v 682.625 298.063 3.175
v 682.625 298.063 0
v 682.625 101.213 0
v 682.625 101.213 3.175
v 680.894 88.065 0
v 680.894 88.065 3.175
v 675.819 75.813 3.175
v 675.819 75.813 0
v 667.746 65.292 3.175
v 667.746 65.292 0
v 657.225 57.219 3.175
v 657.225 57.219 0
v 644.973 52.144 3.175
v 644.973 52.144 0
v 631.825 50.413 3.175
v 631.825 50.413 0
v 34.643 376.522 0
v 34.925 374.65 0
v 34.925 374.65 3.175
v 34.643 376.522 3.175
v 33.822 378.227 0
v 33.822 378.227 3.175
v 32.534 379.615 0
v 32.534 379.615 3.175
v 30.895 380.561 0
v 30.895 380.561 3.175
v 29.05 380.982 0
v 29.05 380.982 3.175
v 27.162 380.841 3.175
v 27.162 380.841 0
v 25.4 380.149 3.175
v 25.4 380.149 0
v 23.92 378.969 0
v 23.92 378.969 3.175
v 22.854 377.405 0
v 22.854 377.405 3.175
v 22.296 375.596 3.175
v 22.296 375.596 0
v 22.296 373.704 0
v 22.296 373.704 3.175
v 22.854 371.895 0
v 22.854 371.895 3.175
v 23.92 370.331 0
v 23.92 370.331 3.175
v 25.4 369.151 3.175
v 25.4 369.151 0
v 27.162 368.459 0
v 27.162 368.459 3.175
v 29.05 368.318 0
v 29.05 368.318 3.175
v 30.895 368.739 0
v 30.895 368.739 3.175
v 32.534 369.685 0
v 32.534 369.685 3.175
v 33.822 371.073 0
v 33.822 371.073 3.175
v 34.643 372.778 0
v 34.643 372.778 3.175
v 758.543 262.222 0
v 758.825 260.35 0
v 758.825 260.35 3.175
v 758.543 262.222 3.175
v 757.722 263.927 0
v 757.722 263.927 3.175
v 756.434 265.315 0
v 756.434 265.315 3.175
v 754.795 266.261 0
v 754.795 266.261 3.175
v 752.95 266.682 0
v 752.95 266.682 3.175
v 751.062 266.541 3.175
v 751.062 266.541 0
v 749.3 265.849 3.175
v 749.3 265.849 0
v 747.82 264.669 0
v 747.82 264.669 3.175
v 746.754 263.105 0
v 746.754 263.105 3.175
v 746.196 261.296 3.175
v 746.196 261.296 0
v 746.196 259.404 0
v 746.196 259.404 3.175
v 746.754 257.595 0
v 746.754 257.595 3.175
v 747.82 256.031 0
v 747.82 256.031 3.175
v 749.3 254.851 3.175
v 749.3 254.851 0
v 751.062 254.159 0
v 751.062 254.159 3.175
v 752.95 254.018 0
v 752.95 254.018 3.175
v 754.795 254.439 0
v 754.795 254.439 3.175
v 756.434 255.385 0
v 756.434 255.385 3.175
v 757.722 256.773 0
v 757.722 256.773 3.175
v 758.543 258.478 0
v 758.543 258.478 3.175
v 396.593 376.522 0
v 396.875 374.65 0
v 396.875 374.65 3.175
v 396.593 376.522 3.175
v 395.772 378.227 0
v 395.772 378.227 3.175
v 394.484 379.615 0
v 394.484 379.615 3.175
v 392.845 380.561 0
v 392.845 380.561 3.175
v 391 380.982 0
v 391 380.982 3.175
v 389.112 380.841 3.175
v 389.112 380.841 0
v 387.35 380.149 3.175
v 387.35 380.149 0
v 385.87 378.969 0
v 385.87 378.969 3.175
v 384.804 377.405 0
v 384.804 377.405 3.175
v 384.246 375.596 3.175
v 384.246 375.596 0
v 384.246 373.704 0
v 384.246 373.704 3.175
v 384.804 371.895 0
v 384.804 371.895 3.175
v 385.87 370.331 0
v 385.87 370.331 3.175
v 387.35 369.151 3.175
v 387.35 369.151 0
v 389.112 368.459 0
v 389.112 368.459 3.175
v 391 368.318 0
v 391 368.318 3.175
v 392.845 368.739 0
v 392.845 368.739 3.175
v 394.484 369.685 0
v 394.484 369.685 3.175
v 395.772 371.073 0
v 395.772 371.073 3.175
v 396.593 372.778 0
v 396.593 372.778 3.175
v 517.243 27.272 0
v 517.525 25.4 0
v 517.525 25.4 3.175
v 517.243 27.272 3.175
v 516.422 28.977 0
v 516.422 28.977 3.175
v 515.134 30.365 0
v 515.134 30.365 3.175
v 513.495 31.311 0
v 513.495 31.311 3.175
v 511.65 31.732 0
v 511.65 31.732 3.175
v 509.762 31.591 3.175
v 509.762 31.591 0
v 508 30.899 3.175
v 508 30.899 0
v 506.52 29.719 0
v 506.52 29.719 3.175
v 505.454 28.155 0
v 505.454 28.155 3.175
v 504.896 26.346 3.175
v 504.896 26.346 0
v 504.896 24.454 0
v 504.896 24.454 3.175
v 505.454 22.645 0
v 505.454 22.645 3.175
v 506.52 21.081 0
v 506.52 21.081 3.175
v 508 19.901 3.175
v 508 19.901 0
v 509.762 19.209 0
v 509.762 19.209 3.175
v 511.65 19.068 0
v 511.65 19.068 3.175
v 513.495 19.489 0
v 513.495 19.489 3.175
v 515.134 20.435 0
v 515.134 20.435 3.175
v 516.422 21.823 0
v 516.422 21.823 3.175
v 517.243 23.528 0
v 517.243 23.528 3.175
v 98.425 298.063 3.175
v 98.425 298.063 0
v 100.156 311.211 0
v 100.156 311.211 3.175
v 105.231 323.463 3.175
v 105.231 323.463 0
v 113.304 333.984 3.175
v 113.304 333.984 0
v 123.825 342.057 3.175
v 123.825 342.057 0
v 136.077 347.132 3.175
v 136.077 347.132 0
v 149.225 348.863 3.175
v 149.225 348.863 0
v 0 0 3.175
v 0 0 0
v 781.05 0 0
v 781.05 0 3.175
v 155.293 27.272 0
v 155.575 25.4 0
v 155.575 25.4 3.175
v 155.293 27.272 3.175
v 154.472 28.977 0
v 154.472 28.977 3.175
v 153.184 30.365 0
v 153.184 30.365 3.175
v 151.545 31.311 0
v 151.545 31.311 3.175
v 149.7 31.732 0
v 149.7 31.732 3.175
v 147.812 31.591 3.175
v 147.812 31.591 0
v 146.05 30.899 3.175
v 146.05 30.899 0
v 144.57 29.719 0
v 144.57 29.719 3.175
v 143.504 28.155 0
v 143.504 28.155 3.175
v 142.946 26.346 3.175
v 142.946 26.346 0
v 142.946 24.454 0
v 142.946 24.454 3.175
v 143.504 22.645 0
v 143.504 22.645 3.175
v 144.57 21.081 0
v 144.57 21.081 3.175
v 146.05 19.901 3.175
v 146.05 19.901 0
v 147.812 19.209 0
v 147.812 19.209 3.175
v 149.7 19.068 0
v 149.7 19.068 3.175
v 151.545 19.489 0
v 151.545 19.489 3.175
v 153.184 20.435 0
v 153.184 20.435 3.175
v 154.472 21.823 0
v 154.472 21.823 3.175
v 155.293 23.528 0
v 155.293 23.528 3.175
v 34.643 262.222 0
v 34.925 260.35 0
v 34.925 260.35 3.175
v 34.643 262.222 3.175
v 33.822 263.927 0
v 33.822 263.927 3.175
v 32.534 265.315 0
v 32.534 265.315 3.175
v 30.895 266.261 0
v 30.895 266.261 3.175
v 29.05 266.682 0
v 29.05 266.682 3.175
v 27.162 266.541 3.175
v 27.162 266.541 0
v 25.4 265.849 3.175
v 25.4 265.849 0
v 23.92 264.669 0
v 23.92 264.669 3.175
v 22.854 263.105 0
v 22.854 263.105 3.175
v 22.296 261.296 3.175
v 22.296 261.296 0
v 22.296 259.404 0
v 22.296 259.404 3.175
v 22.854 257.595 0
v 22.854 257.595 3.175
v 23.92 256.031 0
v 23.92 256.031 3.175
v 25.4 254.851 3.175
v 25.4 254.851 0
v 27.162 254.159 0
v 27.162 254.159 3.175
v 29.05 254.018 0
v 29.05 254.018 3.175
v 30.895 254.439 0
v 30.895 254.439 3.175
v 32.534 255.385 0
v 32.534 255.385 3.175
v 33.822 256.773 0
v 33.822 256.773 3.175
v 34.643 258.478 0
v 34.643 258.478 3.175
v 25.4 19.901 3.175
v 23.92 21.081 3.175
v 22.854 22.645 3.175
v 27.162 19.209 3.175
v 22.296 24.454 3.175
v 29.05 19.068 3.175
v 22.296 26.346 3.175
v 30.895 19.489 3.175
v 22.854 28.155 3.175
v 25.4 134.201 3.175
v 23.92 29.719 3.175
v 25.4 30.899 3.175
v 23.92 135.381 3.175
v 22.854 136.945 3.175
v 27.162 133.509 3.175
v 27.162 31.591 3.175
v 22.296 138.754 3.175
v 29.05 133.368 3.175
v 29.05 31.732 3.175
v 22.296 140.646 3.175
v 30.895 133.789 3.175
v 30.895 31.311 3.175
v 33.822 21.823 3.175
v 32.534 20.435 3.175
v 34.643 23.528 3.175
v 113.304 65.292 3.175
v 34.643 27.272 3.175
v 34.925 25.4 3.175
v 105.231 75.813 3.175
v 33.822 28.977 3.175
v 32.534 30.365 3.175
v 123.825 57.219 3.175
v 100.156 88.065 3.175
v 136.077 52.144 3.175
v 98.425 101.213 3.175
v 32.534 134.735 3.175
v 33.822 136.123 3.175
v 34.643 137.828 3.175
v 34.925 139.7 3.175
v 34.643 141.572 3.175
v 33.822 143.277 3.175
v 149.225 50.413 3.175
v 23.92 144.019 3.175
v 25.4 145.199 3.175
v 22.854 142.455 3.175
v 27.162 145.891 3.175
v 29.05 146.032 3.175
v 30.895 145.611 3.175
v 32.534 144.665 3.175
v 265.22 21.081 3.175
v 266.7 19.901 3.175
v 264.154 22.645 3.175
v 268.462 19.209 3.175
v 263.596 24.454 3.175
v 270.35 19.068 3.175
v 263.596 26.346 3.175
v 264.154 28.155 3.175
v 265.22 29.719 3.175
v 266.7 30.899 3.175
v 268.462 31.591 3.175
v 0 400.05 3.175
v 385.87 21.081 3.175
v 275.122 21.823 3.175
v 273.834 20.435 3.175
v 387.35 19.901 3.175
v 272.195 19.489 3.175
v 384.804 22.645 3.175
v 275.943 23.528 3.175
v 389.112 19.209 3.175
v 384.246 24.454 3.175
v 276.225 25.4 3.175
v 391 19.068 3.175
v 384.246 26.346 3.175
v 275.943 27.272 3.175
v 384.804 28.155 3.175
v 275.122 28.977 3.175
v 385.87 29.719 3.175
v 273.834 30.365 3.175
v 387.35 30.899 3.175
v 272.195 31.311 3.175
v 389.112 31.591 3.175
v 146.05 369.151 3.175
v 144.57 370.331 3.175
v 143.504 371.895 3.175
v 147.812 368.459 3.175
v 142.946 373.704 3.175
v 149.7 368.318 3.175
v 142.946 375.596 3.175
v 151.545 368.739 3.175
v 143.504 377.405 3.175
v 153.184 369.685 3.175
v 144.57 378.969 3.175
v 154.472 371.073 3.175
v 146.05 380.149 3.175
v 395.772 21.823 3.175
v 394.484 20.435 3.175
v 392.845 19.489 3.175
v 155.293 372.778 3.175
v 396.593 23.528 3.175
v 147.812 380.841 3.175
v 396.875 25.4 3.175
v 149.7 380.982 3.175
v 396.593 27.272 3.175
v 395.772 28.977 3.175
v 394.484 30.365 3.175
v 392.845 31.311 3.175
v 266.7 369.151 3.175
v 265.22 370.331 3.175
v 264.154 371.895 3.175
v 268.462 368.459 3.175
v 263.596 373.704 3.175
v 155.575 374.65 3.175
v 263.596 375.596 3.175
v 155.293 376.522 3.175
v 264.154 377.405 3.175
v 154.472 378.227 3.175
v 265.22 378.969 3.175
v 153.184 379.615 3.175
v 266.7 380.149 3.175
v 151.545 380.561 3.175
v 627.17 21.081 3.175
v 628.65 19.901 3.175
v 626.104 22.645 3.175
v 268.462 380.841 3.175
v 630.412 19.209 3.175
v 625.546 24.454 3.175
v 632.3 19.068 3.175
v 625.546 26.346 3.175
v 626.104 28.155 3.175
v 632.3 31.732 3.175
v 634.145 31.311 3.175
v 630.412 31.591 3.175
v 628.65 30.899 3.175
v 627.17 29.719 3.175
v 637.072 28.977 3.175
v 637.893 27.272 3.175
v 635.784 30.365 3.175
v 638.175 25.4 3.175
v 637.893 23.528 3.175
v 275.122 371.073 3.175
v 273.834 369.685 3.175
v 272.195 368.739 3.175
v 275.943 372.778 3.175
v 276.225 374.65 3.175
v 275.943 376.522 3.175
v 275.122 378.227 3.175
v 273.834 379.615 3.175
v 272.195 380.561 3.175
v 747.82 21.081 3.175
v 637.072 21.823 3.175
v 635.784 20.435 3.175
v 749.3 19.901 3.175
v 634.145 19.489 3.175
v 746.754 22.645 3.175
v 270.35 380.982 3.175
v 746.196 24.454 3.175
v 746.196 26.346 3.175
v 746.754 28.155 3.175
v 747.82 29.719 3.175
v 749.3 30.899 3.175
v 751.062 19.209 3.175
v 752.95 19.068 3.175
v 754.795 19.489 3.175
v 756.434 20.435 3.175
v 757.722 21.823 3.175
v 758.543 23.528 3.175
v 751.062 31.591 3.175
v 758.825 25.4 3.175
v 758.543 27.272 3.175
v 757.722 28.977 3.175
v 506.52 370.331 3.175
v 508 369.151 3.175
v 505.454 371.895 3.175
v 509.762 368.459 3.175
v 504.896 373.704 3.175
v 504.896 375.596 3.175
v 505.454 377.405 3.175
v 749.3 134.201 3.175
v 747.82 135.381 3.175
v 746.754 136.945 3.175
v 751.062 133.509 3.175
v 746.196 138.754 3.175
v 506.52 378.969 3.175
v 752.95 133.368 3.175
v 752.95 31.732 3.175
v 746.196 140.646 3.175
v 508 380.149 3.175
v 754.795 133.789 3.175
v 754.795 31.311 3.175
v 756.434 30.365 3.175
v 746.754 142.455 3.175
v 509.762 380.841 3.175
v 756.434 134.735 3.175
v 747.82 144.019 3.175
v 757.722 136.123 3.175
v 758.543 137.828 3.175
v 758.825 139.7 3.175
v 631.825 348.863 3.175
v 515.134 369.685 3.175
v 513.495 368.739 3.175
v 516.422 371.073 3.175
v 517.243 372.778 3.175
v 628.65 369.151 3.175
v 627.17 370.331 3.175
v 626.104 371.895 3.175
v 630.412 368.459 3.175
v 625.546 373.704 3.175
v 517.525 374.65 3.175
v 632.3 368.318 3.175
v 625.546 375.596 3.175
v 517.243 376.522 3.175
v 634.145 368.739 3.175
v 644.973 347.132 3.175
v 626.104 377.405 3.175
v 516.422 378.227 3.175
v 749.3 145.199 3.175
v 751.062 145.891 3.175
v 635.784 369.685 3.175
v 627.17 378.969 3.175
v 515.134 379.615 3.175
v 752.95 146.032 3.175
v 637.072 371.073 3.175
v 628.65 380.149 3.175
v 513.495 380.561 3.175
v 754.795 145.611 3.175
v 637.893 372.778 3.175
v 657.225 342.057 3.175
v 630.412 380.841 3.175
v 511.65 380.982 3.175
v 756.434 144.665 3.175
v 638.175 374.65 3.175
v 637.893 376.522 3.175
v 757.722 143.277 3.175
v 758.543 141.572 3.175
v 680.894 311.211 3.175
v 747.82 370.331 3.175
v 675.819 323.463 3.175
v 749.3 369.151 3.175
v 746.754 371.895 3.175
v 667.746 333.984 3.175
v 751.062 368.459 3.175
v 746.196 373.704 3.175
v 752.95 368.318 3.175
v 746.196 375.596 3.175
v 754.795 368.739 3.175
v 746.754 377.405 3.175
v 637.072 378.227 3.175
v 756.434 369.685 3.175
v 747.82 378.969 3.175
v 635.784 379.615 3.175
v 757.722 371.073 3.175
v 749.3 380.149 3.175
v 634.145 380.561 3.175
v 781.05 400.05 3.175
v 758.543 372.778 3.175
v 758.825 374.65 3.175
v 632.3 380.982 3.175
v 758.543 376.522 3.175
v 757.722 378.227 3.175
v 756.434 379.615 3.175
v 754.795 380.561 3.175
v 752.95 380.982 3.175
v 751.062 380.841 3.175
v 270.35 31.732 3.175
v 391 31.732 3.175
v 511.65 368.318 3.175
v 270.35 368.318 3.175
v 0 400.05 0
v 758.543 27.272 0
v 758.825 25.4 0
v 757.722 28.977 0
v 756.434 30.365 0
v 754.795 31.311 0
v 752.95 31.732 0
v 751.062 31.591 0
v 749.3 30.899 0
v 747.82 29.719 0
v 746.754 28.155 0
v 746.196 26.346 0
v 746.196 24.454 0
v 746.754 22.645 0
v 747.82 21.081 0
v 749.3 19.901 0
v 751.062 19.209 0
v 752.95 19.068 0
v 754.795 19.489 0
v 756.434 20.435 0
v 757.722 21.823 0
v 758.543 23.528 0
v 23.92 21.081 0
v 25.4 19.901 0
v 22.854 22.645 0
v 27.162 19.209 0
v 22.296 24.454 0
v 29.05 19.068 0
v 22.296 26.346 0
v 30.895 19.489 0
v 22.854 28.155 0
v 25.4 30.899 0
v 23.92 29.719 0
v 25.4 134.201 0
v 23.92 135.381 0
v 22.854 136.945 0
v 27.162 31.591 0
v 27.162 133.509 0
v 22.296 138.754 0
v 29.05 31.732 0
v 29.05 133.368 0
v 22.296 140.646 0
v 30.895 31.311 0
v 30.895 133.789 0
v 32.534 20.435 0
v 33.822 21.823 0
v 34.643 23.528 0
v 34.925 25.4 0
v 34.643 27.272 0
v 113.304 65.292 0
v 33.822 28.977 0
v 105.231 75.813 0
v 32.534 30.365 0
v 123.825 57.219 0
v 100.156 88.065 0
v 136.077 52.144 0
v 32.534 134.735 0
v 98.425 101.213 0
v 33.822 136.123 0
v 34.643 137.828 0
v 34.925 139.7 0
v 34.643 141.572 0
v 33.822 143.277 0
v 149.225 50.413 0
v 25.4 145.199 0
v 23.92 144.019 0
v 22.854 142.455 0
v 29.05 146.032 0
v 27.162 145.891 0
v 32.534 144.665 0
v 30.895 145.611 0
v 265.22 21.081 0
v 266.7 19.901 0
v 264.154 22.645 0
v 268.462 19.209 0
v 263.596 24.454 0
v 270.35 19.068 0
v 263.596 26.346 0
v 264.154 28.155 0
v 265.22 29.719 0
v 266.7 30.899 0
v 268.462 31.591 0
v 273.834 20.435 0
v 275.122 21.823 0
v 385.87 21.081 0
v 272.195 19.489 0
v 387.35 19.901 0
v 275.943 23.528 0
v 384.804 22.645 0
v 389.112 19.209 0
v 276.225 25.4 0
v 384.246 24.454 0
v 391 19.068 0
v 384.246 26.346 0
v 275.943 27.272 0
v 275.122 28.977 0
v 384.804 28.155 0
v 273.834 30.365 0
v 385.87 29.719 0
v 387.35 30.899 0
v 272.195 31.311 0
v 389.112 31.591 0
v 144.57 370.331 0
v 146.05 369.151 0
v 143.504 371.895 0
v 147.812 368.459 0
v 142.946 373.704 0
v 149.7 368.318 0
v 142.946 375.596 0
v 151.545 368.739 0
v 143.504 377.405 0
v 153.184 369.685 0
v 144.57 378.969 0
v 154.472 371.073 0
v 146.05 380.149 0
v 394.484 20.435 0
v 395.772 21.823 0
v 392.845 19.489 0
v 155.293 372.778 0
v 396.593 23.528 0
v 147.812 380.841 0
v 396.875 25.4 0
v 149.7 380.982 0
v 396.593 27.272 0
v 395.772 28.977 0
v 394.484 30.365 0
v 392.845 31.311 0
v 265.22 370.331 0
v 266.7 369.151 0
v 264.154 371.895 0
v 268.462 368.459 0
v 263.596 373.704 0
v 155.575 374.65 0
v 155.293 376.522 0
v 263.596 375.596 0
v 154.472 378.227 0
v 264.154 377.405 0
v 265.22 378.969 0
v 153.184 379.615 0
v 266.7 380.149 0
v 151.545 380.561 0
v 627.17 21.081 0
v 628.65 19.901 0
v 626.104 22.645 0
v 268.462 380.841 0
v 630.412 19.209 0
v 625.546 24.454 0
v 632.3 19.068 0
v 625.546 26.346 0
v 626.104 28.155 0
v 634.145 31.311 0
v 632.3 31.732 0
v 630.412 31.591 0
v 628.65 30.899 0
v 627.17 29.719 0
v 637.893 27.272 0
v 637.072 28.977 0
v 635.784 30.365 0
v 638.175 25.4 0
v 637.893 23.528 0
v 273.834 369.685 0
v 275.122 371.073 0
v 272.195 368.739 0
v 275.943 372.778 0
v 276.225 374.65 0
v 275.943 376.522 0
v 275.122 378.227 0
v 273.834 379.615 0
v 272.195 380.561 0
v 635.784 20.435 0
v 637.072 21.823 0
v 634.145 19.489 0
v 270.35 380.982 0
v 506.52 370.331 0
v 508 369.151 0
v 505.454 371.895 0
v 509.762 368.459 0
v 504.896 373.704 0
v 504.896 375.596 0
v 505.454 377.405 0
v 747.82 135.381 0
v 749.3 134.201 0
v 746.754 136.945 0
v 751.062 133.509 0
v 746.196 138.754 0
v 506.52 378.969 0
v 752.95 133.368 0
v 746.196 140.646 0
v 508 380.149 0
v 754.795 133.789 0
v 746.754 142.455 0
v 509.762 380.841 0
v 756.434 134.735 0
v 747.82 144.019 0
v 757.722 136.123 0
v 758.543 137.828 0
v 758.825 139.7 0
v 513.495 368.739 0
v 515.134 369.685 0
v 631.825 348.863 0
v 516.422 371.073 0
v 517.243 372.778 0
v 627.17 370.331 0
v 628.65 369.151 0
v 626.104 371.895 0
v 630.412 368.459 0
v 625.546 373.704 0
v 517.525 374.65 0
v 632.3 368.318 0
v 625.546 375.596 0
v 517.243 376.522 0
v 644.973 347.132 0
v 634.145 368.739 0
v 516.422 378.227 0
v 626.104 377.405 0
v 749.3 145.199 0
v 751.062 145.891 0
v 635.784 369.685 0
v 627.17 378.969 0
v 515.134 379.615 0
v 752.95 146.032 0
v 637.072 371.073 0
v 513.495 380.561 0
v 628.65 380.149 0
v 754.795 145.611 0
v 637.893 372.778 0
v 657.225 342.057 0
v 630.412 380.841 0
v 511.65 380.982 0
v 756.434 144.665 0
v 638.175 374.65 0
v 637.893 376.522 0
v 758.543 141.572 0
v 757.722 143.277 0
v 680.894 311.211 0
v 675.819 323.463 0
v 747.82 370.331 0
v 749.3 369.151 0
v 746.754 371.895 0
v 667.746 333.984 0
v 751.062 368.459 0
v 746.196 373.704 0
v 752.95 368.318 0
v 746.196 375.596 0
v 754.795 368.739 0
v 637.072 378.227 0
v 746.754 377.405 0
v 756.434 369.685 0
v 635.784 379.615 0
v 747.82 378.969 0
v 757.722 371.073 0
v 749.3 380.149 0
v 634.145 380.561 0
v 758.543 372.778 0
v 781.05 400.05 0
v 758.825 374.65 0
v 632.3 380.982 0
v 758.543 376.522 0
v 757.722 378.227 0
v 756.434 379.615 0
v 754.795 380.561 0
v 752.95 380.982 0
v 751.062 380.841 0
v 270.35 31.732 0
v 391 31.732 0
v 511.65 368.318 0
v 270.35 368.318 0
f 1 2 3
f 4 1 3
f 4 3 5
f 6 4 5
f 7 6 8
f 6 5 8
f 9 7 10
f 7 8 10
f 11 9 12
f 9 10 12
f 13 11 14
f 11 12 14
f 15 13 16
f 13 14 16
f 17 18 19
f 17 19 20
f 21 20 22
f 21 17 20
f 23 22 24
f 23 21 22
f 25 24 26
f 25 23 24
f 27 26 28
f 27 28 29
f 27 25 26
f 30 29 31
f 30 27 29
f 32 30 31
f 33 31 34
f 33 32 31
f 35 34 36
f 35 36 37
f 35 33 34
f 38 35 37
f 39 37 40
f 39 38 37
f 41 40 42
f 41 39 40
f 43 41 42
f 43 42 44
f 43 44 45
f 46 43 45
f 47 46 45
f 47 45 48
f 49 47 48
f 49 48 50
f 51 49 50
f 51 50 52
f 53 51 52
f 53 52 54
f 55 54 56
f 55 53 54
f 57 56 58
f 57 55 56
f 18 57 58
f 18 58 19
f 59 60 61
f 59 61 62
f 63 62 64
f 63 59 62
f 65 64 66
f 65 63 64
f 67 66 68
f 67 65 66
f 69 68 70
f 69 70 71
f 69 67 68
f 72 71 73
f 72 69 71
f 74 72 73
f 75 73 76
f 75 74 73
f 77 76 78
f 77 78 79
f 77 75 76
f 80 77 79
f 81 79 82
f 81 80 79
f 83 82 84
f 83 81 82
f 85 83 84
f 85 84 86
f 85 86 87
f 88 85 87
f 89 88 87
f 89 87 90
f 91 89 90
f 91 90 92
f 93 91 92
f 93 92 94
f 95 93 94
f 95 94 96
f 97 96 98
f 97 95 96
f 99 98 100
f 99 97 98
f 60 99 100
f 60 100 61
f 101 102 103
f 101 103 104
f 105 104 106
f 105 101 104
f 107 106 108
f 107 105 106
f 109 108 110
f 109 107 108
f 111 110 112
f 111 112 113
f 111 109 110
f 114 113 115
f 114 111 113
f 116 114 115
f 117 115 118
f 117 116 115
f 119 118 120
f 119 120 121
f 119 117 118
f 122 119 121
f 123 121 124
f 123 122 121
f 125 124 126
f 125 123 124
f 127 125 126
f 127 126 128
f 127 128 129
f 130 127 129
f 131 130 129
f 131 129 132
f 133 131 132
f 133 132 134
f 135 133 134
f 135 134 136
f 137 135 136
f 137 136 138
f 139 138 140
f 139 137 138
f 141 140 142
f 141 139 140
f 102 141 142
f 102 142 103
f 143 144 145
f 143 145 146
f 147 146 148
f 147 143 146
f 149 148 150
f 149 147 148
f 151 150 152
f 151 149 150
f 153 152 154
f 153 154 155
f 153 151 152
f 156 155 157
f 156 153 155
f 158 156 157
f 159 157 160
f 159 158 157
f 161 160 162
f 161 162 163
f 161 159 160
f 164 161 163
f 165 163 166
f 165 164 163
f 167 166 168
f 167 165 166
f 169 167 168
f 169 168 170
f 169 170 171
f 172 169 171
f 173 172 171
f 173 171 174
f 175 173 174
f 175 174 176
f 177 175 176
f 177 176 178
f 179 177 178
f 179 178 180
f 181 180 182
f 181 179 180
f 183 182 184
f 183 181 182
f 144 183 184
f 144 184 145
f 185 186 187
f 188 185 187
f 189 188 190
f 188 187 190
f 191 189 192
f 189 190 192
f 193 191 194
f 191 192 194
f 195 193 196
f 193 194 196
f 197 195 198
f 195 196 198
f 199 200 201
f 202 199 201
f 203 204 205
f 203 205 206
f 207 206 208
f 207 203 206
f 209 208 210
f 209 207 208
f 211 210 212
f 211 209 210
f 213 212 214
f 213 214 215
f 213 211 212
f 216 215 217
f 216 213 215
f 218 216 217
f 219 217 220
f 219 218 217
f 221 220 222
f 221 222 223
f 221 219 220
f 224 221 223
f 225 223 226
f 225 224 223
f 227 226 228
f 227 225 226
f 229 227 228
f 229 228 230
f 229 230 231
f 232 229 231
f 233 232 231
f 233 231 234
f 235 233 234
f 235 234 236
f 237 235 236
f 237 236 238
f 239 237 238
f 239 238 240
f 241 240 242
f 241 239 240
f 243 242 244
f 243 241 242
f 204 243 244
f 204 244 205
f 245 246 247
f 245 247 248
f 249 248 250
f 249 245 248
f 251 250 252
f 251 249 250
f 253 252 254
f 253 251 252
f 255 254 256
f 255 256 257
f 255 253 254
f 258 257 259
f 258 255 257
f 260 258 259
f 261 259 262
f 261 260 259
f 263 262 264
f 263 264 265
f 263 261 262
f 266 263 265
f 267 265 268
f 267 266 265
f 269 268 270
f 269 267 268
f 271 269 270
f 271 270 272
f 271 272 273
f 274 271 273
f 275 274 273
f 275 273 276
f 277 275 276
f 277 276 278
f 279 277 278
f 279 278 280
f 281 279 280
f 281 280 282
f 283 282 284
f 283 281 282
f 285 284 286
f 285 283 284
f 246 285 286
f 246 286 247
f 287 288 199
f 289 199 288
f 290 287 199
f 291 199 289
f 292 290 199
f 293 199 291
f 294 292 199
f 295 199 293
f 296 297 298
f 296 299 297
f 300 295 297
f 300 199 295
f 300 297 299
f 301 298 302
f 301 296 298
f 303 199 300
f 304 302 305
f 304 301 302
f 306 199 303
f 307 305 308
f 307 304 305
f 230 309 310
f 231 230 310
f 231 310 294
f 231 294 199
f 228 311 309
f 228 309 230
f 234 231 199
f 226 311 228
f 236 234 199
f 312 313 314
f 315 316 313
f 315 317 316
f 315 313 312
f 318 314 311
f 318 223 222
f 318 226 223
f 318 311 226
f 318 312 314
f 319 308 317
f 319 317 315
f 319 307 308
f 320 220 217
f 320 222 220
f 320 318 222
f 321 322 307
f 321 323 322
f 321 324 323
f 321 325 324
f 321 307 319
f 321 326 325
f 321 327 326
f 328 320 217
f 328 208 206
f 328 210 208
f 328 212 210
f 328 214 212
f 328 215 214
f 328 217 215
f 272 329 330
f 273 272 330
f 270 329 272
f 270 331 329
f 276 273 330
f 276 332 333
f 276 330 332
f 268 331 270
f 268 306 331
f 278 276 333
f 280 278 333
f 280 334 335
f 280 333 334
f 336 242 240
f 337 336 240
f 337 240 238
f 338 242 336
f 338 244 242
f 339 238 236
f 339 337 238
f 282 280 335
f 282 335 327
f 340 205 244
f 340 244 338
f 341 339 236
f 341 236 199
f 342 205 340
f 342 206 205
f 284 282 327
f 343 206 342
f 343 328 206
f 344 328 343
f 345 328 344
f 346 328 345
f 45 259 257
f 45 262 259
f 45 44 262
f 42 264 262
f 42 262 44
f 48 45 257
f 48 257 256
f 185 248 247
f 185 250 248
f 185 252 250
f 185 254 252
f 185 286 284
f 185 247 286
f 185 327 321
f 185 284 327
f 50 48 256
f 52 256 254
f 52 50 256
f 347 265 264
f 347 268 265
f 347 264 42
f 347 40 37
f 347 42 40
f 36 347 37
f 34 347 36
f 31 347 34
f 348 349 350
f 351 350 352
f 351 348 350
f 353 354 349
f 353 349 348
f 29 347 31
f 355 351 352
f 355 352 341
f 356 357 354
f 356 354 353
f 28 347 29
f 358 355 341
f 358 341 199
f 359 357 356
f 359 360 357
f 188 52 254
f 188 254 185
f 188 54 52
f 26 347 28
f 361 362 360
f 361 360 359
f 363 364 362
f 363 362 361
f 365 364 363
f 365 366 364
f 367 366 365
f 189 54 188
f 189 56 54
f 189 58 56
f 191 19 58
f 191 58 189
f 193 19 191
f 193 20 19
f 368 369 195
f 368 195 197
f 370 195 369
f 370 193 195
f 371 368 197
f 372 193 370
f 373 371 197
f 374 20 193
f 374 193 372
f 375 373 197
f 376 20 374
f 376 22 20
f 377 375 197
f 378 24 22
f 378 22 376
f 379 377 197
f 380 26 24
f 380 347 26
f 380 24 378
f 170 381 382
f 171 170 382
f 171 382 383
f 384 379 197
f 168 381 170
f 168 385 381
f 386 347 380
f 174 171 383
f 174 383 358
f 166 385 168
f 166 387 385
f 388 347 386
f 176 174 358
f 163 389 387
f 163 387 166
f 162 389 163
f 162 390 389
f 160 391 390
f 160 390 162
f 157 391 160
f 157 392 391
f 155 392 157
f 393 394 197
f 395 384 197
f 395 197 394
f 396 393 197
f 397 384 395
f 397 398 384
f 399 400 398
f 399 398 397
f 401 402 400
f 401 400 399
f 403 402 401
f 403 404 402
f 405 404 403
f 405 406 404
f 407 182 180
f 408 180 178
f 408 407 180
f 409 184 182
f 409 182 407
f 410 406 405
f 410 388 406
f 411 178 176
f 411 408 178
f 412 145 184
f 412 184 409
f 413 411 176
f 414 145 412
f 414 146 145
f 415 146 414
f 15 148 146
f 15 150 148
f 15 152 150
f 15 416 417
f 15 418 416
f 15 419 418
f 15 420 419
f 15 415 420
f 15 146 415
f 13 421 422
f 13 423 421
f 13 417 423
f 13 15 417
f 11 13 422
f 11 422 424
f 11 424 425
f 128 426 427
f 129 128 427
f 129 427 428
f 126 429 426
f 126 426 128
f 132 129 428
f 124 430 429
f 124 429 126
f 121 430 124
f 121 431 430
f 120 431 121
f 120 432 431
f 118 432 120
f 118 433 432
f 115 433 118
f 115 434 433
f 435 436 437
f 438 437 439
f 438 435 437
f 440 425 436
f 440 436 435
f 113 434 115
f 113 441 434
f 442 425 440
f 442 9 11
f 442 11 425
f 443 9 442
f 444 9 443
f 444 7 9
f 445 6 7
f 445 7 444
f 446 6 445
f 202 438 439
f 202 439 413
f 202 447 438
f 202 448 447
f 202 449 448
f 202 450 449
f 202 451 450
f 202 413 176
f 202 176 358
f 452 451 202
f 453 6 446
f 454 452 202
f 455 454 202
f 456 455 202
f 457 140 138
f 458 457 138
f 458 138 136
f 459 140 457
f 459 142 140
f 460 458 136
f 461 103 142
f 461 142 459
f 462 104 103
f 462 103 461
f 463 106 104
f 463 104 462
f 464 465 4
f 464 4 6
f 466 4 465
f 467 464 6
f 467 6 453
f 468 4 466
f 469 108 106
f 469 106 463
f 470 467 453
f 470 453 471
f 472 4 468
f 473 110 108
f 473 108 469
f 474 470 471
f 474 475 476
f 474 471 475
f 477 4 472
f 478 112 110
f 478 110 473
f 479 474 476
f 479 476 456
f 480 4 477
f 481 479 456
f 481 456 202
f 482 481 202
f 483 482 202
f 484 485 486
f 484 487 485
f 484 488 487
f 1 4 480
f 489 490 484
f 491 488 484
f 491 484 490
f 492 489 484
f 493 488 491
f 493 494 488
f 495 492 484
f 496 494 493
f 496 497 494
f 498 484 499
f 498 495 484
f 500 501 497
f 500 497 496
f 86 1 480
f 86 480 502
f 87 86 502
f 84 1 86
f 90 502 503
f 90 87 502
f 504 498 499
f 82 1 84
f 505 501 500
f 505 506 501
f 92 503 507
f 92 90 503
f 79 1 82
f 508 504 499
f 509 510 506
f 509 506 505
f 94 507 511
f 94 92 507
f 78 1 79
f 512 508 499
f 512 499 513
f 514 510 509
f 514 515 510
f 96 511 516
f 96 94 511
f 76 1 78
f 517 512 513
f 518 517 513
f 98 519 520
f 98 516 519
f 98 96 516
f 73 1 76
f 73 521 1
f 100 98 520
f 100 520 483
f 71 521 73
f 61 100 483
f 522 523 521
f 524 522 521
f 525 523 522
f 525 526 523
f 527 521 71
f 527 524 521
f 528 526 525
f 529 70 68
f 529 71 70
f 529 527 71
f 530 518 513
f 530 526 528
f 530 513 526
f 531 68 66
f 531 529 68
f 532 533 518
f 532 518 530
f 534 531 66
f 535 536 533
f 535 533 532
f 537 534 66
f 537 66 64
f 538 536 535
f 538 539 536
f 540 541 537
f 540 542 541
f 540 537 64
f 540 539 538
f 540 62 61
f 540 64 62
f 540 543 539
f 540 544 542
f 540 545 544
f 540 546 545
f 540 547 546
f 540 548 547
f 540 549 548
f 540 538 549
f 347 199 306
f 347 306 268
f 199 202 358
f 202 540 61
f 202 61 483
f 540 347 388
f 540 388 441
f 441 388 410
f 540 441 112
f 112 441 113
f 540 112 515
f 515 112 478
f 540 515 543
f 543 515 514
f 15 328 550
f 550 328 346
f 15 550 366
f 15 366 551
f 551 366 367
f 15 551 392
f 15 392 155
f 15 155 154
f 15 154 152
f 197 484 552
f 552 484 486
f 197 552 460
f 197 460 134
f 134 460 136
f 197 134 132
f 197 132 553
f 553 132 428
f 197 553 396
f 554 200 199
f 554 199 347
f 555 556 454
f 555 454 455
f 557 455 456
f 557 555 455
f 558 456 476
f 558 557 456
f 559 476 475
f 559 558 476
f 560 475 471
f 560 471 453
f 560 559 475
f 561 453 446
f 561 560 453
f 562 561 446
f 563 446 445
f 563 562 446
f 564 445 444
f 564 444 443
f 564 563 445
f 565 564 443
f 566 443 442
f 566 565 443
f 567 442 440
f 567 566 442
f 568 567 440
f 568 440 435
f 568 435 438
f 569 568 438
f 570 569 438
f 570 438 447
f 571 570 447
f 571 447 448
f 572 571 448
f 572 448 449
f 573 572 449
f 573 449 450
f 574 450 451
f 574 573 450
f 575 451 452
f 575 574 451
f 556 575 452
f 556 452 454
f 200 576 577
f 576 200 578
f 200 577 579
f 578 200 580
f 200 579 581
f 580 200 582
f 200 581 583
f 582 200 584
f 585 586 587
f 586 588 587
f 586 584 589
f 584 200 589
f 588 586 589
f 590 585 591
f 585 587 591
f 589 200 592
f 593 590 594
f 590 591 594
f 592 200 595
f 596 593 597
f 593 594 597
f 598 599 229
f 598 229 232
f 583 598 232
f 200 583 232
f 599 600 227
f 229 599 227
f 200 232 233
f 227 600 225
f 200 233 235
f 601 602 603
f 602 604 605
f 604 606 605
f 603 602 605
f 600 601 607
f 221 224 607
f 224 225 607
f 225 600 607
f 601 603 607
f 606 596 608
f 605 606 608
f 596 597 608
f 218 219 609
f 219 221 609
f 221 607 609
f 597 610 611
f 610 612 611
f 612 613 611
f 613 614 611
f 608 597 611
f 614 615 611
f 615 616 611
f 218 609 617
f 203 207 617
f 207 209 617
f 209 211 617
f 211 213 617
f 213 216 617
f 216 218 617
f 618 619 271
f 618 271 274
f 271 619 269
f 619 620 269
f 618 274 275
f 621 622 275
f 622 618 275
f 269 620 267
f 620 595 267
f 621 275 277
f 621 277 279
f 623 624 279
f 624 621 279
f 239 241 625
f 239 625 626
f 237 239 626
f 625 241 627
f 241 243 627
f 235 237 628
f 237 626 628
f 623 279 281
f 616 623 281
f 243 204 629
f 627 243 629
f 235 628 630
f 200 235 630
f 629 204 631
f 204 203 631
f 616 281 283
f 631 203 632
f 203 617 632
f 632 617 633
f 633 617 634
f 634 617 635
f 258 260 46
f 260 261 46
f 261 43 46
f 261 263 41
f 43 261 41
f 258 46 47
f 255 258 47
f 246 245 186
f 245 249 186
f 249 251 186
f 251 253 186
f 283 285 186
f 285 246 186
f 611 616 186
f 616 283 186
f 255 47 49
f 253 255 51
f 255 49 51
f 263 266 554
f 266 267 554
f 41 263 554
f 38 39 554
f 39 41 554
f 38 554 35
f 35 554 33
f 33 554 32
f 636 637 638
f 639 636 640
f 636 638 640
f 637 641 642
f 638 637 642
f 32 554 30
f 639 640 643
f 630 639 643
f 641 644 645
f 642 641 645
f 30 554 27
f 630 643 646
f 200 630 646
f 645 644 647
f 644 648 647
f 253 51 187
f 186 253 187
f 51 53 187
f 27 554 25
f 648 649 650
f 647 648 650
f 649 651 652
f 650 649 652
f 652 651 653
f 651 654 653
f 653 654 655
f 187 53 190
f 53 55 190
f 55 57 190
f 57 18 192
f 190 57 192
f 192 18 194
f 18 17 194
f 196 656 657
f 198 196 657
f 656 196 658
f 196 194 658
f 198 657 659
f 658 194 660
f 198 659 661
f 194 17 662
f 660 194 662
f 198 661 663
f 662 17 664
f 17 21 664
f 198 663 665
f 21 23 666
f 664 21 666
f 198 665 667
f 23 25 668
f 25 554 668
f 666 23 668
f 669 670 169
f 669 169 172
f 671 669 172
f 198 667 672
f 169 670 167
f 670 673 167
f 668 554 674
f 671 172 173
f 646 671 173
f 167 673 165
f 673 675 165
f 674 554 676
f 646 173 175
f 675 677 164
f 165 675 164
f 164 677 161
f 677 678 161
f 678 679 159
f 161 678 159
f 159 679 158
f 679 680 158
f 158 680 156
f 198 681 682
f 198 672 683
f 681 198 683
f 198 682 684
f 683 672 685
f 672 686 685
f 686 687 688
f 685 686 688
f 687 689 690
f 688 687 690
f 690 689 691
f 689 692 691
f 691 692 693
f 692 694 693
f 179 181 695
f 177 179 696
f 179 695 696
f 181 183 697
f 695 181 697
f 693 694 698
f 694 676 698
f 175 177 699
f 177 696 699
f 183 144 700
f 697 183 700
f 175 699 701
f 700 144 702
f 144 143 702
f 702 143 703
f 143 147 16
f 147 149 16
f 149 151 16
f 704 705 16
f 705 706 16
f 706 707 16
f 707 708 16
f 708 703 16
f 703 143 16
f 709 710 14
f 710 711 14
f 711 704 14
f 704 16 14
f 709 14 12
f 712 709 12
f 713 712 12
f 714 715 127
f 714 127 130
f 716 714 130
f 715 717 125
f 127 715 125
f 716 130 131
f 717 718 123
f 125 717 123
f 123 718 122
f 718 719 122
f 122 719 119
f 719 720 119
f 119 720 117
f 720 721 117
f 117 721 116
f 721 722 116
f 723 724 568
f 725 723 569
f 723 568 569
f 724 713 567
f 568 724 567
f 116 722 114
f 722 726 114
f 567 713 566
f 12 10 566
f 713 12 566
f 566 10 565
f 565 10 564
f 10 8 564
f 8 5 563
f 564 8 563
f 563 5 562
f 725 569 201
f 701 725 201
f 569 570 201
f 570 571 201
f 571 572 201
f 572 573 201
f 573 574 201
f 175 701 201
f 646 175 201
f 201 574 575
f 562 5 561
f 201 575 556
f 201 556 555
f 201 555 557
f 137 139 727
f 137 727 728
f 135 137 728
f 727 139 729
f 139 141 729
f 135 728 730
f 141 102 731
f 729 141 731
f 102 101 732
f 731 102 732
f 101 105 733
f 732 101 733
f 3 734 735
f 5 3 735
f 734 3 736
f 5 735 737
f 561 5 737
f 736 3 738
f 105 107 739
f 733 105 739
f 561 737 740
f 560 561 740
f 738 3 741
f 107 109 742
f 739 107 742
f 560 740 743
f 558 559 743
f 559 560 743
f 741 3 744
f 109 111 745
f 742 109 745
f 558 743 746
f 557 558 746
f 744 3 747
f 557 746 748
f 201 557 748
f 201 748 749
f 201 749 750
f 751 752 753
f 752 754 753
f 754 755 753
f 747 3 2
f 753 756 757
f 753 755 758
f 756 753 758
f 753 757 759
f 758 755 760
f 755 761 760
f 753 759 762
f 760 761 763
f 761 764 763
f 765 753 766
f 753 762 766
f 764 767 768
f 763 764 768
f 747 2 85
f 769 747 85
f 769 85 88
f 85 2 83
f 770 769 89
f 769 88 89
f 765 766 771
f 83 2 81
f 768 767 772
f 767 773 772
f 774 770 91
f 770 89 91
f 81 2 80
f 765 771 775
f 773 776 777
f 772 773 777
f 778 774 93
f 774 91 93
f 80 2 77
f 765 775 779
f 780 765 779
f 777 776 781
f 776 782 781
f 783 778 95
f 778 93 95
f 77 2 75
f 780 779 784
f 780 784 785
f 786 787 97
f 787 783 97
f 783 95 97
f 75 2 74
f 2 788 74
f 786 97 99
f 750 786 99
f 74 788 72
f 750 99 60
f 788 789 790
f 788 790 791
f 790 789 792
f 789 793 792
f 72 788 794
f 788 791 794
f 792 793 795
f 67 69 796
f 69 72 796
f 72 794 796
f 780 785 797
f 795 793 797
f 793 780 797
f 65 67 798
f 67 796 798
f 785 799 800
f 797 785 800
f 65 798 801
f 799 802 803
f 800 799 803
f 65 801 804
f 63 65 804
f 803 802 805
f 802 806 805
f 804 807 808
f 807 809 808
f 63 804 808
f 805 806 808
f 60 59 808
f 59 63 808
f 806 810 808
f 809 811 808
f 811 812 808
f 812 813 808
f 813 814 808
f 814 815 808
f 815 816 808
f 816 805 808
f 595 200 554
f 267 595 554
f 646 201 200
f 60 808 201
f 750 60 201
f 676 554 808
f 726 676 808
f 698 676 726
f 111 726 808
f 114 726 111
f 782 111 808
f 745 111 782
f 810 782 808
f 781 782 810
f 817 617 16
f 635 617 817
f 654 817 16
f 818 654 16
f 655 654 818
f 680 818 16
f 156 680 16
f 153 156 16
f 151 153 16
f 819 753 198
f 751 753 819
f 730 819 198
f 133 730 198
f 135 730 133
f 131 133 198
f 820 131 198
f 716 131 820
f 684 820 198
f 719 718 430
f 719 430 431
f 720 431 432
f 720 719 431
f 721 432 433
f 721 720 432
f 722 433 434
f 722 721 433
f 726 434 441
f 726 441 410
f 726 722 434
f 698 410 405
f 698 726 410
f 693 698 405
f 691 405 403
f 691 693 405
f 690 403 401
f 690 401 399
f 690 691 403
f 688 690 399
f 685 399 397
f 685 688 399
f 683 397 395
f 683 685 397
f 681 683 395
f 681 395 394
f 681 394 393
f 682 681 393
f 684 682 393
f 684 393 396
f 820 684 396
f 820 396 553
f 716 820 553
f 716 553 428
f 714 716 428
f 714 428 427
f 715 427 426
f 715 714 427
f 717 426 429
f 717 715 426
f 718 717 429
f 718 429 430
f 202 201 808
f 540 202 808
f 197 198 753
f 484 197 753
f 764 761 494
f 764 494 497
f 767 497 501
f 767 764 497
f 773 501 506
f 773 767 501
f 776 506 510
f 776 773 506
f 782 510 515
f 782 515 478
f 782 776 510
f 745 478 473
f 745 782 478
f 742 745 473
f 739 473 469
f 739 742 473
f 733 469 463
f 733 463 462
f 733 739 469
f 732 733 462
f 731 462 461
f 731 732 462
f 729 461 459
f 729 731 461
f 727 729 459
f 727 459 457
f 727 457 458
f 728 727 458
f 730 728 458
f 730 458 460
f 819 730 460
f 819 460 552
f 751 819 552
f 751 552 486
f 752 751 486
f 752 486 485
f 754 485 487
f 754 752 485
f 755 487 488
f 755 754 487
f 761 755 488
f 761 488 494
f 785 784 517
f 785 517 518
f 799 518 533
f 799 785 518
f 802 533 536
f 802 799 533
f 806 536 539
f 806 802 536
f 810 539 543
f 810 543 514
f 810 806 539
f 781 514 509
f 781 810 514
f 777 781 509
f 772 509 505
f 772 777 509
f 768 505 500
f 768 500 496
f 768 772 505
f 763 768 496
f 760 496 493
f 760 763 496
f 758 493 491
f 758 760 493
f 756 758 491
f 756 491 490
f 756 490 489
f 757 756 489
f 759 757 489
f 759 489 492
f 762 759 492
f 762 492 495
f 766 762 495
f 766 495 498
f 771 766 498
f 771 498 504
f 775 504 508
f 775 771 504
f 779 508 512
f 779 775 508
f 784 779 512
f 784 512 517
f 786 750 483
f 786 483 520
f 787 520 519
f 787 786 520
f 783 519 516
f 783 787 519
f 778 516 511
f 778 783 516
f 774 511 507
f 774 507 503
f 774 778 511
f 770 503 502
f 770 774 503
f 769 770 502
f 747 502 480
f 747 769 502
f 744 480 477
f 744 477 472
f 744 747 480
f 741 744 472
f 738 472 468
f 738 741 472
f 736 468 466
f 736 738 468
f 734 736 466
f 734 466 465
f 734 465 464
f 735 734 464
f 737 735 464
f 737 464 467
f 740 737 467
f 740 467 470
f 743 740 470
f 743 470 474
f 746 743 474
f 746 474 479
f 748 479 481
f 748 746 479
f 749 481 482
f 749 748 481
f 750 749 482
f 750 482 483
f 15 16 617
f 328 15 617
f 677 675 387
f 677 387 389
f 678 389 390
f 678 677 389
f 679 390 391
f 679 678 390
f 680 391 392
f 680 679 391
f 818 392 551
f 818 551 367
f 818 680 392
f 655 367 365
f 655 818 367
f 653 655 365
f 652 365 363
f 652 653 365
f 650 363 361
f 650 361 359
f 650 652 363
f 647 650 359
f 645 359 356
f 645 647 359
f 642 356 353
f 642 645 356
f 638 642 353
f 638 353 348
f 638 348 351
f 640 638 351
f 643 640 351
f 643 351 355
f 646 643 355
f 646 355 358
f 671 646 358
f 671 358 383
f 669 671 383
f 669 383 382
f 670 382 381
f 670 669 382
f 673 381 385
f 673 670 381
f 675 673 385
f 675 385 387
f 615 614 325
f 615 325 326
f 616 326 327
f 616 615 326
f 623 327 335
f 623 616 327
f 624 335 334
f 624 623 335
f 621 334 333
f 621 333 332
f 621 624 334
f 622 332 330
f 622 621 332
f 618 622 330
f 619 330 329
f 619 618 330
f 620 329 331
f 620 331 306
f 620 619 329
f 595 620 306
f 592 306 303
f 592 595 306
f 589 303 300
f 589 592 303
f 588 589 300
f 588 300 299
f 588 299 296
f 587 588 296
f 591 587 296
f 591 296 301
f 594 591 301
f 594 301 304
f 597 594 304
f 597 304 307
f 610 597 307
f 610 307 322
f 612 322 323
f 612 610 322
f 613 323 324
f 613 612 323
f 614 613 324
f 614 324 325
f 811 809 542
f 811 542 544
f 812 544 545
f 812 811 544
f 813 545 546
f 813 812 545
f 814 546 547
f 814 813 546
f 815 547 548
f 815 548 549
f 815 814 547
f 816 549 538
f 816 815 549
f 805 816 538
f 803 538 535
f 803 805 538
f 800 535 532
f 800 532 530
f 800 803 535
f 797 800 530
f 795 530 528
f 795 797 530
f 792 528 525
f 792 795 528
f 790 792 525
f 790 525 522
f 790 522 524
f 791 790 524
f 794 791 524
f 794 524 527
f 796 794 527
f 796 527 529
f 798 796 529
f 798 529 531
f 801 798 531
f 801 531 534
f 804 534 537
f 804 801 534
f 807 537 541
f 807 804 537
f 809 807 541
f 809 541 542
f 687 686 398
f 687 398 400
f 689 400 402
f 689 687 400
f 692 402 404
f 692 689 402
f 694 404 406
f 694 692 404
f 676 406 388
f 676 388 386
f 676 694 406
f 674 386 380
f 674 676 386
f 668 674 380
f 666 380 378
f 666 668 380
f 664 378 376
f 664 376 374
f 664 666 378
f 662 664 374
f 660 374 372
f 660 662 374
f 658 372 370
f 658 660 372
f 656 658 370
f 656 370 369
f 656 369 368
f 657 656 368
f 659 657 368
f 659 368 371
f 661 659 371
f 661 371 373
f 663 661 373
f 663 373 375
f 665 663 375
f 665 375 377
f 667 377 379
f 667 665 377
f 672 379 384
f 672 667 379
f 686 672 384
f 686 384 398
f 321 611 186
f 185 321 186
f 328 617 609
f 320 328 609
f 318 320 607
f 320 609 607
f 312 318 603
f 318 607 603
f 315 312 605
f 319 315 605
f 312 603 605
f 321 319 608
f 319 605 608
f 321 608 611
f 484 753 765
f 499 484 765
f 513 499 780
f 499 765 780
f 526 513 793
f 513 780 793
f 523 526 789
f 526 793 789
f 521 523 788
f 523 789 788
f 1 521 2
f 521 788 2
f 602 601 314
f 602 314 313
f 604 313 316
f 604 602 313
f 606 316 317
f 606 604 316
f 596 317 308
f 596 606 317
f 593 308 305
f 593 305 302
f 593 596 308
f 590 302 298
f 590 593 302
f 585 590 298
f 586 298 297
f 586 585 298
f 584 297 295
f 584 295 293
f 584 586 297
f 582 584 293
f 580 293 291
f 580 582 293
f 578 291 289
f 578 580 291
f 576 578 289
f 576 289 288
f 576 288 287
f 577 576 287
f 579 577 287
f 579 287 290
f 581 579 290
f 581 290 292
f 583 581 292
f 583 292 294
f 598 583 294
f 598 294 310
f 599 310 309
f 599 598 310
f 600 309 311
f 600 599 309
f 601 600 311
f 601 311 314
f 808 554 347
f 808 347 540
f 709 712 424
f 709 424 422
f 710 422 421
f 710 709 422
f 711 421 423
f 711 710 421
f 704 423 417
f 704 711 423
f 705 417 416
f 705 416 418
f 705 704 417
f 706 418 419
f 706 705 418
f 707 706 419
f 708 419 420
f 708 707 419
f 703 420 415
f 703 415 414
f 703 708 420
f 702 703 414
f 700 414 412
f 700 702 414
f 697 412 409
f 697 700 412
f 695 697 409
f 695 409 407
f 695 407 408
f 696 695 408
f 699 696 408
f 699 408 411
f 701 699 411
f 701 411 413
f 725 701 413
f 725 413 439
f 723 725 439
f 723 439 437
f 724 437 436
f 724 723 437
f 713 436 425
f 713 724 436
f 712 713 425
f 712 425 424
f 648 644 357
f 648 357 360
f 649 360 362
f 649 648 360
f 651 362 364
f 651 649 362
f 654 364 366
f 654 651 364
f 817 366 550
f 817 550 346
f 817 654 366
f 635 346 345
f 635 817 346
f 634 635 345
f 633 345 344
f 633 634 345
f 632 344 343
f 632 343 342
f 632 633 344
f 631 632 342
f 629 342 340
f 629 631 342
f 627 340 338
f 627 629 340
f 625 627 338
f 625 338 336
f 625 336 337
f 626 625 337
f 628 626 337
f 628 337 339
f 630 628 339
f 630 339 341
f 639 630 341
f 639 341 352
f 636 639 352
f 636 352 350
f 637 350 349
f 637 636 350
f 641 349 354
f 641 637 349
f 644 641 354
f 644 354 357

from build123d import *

# Parameters (mm, degrees)
F0_W     = 781.05
F0_H     = 400.05
F0_R     = 6.35
F1_DEPTH = 3.175


with BuildPart() as f1:
    # F0 (on Top) → F1 (new body)
    with BuildSketch(Plane.XY):
        with Locations((390.525, 200.025)):
            Rectangle(F0_W, F0_H)
        with Locations((28.575, 25.4)):
            Circle(F0_R, mode=Mode.SUBTRACT)
        with Locations((149.225, 25.4)):
            Circle(F0_R, mode=Mode.SUBTRACT)
        with Locations((269.875, 25.4)):
            Circle(F0_R, mode=Mode.SUBTRACT)
        with Locations((28.575, 139.7)):
            Circle(F0_R, mode=Mode.SUBTRACT)
        with Locations((390.525, 25.4)):
            Circle(F0_R, mode=Mode.SUBTRACT)
        with Locations((511.175, 25.4)):
            Circle(F0_R, mode=Mode.SUBTRACT)
        with Locations((631.825, 25.4)):
            Circle(F0_R, mode=Mode.SUBTRACT)
        with Locations((752.475, 25.4)):
            Circle(F0_R, mode=Mode.SUBTRACT)
        with BuildLine():
            Line((631.825, 50.412805), (149.225, 50.412805))
            ThreePointArc((149.225, 50.412805), (113.303976, 65.29178), (98.425, 101.212805))
            Line((98.425, 101.212805), (98.425, 298.062805))
            ThreePointArc((98.425, 298.062805), (113.303976, 333.983829), (149.225, 348.862805))
            Line((149.225, 348.862805), (631.825, 348.862805))
            ThreePointArc((631.825, 348.862805), (667.746024, 333.983829), (682.625, 298.062805))
            Line((682.625, 298.062805), (682.625, 101.212805))
            ThreePointArc((682.625, 101.212805), (667.746024, 65.29178), (631.825, 50.412805))
        make_face(mode=Mode.SUBTRACT)
        with Locations((752.475, 139.7)):
            Circle(F0_R, mode=Mode.SUBTRACT)
        with Locations((28.575, 260.35)):
            Circle(F0_R, mode=Mode.SUBTRACT)
        with Locations((28.575, 374.65)):
            Circle(F0_R, mode=Mode.SUBTRACT)
        with Locations((149.225, 374.65)):
            Circle(F0_R, mode=Mode.SUBTRACT)
        with Locations((269.875, 374.65)):
            Circle(F0_R, mode=Mode.SUBTRACT)
        with Locations((752.475, 260.35)):
            Circle(F0_R, mode=Mode.SUBTRACT)
        with Locations((390.525, 374.65)):
            Circle(F0_R, mode=Mode.SUBTRACT)
        with Locations((511.175, 374.65)):
            Circle(F0_R, mode=Mode.SUBTRACT)
        with Locations((631.825, 374.65)):
            Circle(F0_R, mode=Mode.SUBTRACT)
        with Locations((752.475, 374.65)):
            Circle(F0_R, mode=Mode.SUBTRACT)
    extrude(amount=F1_DEPTH)


solid = f1.part
